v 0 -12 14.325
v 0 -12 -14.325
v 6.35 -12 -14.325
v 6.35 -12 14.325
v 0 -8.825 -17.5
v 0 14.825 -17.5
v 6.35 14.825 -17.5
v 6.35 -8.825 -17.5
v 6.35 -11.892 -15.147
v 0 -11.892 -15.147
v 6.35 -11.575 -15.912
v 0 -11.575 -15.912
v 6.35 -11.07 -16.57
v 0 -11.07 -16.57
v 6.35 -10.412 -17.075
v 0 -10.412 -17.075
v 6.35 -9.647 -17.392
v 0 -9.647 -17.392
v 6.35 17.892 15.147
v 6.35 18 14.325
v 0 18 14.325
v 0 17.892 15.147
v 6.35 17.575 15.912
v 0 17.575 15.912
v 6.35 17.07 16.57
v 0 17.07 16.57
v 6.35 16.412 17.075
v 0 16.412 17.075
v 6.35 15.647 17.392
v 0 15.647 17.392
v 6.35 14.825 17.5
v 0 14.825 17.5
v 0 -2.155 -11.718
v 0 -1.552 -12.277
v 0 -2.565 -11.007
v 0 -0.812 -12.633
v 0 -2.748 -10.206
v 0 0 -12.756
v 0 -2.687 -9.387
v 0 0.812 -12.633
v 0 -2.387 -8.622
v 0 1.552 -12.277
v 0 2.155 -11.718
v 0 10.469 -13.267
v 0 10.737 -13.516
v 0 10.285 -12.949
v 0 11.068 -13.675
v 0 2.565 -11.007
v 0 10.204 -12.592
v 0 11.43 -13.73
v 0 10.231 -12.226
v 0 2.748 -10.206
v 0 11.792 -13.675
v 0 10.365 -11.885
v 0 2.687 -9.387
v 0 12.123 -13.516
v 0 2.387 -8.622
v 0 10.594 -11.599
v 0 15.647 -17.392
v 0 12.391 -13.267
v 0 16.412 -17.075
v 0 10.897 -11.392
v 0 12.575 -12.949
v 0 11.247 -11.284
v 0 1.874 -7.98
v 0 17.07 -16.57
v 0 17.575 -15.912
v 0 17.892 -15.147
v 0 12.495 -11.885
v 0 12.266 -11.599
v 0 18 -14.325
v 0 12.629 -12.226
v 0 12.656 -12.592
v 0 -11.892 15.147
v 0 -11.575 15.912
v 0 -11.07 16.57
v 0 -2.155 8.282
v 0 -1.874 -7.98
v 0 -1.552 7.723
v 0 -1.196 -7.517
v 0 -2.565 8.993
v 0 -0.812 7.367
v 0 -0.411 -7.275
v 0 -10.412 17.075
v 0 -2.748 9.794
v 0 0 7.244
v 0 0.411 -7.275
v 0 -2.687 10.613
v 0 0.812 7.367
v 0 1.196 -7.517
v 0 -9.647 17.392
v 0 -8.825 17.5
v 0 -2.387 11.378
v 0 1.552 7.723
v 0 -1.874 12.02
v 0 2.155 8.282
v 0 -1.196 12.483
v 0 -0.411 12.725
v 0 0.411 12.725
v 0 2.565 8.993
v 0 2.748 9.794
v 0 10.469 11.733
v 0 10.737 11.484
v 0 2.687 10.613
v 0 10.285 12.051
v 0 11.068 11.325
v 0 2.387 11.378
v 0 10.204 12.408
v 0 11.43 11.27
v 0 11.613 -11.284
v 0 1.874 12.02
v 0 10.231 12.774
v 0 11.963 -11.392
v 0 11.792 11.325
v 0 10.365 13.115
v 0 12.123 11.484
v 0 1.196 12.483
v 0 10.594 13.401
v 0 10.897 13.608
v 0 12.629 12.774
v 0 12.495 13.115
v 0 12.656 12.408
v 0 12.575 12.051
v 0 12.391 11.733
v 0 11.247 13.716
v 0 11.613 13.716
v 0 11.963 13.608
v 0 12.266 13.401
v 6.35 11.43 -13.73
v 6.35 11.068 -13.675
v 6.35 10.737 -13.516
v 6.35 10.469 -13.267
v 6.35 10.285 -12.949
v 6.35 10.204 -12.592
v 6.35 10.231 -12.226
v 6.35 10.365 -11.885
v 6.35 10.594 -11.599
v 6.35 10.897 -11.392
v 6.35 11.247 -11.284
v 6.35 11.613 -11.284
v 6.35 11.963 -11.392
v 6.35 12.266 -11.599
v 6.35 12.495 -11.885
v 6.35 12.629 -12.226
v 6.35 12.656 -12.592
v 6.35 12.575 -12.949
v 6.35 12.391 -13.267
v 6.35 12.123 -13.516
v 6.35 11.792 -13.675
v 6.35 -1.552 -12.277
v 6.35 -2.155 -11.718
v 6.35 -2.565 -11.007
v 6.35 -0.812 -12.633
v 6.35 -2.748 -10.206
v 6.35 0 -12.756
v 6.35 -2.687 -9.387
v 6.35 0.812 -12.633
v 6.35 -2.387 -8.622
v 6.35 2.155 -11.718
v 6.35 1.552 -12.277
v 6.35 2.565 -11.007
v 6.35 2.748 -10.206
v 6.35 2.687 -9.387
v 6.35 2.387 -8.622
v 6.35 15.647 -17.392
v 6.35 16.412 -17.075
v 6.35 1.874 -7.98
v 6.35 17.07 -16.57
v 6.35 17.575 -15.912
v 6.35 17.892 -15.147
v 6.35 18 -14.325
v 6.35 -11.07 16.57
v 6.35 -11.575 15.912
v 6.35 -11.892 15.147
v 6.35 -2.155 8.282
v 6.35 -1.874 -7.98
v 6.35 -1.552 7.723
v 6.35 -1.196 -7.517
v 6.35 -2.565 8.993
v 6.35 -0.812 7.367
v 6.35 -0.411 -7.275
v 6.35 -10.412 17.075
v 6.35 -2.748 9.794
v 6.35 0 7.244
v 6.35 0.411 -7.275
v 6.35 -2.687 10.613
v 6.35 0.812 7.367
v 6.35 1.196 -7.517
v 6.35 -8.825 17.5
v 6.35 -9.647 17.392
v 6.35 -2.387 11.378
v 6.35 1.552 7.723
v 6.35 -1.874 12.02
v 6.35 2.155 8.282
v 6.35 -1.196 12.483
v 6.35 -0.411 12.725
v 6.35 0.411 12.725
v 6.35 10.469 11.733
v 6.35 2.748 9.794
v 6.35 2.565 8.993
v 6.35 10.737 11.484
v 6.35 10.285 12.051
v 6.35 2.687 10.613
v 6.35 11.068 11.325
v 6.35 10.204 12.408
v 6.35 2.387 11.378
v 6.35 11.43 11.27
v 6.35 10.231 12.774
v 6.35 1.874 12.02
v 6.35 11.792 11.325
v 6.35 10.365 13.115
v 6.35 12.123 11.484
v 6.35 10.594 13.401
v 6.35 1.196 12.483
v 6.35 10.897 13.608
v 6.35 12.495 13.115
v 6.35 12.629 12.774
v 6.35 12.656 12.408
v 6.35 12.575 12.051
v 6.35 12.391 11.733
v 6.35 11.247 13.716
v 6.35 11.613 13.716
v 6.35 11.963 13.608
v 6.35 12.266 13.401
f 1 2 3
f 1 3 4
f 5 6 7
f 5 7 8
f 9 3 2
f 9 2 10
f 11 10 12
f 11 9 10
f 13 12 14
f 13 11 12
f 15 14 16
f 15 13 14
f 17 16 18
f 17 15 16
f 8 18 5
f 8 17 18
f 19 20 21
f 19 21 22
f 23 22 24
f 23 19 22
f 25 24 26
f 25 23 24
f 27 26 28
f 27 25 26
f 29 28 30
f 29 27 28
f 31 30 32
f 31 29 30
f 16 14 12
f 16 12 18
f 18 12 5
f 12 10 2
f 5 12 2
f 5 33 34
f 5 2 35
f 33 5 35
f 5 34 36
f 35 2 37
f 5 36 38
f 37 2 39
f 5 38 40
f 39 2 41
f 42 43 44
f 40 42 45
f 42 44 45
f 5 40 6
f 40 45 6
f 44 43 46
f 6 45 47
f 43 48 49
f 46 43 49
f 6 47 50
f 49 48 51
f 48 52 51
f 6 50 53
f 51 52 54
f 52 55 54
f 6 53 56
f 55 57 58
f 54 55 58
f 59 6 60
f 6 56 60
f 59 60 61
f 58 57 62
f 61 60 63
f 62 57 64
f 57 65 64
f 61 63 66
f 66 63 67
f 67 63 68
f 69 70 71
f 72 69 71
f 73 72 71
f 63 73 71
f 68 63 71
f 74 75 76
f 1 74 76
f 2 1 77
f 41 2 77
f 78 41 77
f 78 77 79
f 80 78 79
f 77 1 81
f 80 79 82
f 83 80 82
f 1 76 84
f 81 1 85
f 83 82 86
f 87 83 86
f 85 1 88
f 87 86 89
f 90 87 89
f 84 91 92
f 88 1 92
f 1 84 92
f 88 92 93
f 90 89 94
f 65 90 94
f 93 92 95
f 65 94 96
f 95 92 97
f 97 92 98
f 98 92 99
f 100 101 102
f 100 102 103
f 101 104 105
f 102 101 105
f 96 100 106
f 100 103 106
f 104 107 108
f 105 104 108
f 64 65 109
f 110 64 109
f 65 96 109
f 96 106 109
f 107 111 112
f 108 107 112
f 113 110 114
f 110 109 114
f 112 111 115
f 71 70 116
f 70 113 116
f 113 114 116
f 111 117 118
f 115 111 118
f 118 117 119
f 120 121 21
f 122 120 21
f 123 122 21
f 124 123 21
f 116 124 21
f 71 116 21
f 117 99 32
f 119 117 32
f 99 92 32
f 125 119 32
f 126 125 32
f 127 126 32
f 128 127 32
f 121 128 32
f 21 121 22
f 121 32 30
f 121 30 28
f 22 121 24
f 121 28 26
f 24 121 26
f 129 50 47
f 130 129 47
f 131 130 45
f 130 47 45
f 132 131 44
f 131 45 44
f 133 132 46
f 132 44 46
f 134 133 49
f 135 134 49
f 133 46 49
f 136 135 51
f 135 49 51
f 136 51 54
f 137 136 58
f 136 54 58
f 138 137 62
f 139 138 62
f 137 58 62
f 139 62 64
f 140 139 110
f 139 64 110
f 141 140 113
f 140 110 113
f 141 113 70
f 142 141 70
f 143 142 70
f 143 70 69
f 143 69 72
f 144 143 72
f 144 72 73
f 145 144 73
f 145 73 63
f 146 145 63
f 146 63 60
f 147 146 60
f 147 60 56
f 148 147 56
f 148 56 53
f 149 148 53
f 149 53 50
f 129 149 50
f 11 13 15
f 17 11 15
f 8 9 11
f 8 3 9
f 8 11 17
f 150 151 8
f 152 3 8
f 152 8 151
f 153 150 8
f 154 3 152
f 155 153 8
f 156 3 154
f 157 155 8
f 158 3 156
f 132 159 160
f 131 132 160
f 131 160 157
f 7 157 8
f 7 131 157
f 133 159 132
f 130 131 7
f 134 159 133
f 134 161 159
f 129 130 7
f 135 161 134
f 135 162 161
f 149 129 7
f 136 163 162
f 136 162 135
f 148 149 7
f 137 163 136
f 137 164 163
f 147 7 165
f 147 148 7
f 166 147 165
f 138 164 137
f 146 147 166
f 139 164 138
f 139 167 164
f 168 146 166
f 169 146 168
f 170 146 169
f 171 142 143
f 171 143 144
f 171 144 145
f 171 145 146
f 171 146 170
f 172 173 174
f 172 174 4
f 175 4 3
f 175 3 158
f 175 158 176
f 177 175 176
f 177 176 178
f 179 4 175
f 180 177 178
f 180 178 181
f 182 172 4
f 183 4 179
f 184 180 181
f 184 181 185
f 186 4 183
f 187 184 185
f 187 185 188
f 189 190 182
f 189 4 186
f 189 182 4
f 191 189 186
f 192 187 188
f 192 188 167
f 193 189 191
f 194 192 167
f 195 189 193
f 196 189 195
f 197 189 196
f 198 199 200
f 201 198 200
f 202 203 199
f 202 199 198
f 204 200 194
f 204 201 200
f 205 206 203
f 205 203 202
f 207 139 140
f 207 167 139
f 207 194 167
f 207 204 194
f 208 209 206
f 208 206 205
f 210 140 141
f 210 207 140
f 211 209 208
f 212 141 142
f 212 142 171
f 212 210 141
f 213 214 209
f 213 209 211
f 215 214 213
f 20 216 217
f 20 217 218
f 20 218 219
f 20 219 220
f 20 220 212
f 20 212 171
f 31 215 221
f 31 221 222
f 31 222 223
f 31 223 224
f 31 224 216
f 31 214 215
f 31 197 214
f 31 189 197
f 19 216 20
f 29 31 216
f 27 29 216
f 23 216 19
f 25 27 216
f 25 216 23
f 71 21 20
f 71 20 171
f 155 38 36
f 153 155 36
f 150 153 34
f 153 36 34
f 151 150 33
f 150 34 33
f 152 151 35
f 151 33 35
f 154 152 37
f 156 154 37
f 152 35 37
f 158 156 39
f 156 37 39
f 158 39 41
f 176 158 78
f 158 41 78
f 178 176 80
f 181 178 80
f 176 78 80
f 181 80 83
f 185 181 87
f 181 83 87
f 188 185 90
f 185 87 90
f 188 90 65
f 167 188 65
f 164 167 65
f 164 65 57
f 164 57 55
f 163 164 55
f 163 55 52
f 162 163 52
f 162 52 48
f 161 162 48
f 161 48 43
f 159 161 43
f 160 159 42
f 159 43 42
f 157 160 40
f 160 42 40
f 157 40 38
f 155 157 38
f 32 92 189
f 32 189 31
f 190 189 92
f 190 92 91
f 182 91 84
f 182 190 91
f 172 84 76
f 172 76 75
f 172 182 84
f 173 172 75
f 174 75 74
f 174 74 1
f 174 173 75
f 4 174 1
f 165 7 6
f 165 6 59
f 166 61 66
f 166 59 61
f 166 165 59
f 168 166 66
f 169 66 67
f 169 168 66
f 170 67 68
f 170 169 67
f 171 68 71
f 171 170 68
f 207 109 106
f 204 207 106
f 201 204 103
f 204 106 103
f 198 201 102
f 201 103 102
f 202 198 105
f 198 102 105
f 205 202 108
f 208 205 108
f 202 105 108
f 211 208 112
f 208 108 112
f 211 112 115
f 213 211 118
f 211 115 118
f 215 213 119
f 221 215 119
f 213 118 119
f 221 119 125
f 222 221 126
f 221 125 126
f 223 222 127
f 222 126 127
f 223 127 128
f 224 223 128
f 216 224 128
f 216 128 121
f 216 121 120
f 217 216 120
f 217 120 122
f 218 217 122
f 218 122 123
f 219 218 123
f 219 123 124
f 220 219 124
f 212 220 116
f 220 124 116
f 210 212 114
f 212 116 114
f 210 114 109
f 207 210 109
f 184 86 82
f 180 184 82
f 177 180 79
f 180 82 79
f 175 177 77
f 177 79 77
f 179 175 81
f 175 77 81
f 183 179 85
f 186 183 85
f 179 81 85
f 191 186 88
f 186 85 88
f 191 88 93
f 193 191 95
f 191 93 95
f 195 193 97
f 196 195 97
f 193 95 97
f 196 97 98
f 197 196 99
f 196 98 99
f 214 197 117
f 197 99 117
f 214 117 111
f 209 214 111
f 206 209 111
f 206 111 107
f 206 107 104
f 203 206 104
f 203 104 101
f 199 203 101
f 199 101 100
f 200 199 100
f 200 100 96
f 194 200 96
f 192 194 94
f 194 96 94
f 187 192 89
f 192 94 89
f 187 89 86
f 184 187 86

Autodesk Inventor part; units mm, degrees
ref_plane "YZ Plane" through (0, 0, 0) normal (1, 0, 0) x (0, 1, 0)
ref_plane "XZ Plane" through (0, 0, 0) normal (0, 1, 0) x (-1, 0, 0)
ref_plane "XY Plane" through (0, 0, 0) normal (0, 0, 1) x (1, 0, 0)
sketch "Sketch1" plane through (0, 0, 0) normal (1, 0, 0) x (0, 1, 0)
  line L0 (-12, 17.5) -> (18, 17.5)
  line L1 (18, 17.5) -> (18, -17.5)
  line L2 (18, -17.5) -> (-12, -17.5)
  line L3 (-12, -17.5) -> (-12, 17.5)
  point P0 (0, 0)
  dimension "d0" = 35
  dimension "d1" = 30
  dimension "d3" = 17.5
  dimension "d7" = 18
extrude "Extrusion1" add sketch "Sketch1" along normal blind 6.35
fillet "Fillet1" radius 3.175 4 edges at (3.175, -12, -17.5) (3.175, -12, 17.5) (3.175, 18, 17.5) (3.175, 18, -17.5)
sketch "Sketch2" plane through (6.35, 0, 0) normal (1, 0, 0) x (0, 0, -1)
  point P0 (0, 0)
  point P1 (-10, 0)
  point P2 (10, 0)
  dimension "d15" = 20
  dimension "d16" = 10
hole "Hole1" at (6.35, 0, 10) at (6.35, 0, -10) direction (-1, 0, 0) diameter 5.5118 end through all clearance for "Hex Head Bolt" size "M5" standard "Ansi Metric M Profile"
sketch "Sketch3" plane through (6.35, 0, 0) normal (1, 0, 0) x (0, 0, -1)
  point P0 (0, 0)
  point P1 (-12.5, 11.43)
  point P2 (12.5, 11.43)
  dimension "d17" = 25
  dimension "d18" = 12.5
  dimension "d19" = 11.43
hole "Hole2" at (6.35, 11.43, 12.5) at (6.35, 11.43, -12.5) direction (-1, 0, 0) diameter 2.459 end through all thread size "M3x0.5" class "6H" standard "ANSI Metric M Profile"
equation "\"d3\" = 0.5 * d0"
equation "\"d16\" = 0.5 * d15"
equation "\"d18\" = 0.5 * d17"
properties material "ABS, BLACK"
